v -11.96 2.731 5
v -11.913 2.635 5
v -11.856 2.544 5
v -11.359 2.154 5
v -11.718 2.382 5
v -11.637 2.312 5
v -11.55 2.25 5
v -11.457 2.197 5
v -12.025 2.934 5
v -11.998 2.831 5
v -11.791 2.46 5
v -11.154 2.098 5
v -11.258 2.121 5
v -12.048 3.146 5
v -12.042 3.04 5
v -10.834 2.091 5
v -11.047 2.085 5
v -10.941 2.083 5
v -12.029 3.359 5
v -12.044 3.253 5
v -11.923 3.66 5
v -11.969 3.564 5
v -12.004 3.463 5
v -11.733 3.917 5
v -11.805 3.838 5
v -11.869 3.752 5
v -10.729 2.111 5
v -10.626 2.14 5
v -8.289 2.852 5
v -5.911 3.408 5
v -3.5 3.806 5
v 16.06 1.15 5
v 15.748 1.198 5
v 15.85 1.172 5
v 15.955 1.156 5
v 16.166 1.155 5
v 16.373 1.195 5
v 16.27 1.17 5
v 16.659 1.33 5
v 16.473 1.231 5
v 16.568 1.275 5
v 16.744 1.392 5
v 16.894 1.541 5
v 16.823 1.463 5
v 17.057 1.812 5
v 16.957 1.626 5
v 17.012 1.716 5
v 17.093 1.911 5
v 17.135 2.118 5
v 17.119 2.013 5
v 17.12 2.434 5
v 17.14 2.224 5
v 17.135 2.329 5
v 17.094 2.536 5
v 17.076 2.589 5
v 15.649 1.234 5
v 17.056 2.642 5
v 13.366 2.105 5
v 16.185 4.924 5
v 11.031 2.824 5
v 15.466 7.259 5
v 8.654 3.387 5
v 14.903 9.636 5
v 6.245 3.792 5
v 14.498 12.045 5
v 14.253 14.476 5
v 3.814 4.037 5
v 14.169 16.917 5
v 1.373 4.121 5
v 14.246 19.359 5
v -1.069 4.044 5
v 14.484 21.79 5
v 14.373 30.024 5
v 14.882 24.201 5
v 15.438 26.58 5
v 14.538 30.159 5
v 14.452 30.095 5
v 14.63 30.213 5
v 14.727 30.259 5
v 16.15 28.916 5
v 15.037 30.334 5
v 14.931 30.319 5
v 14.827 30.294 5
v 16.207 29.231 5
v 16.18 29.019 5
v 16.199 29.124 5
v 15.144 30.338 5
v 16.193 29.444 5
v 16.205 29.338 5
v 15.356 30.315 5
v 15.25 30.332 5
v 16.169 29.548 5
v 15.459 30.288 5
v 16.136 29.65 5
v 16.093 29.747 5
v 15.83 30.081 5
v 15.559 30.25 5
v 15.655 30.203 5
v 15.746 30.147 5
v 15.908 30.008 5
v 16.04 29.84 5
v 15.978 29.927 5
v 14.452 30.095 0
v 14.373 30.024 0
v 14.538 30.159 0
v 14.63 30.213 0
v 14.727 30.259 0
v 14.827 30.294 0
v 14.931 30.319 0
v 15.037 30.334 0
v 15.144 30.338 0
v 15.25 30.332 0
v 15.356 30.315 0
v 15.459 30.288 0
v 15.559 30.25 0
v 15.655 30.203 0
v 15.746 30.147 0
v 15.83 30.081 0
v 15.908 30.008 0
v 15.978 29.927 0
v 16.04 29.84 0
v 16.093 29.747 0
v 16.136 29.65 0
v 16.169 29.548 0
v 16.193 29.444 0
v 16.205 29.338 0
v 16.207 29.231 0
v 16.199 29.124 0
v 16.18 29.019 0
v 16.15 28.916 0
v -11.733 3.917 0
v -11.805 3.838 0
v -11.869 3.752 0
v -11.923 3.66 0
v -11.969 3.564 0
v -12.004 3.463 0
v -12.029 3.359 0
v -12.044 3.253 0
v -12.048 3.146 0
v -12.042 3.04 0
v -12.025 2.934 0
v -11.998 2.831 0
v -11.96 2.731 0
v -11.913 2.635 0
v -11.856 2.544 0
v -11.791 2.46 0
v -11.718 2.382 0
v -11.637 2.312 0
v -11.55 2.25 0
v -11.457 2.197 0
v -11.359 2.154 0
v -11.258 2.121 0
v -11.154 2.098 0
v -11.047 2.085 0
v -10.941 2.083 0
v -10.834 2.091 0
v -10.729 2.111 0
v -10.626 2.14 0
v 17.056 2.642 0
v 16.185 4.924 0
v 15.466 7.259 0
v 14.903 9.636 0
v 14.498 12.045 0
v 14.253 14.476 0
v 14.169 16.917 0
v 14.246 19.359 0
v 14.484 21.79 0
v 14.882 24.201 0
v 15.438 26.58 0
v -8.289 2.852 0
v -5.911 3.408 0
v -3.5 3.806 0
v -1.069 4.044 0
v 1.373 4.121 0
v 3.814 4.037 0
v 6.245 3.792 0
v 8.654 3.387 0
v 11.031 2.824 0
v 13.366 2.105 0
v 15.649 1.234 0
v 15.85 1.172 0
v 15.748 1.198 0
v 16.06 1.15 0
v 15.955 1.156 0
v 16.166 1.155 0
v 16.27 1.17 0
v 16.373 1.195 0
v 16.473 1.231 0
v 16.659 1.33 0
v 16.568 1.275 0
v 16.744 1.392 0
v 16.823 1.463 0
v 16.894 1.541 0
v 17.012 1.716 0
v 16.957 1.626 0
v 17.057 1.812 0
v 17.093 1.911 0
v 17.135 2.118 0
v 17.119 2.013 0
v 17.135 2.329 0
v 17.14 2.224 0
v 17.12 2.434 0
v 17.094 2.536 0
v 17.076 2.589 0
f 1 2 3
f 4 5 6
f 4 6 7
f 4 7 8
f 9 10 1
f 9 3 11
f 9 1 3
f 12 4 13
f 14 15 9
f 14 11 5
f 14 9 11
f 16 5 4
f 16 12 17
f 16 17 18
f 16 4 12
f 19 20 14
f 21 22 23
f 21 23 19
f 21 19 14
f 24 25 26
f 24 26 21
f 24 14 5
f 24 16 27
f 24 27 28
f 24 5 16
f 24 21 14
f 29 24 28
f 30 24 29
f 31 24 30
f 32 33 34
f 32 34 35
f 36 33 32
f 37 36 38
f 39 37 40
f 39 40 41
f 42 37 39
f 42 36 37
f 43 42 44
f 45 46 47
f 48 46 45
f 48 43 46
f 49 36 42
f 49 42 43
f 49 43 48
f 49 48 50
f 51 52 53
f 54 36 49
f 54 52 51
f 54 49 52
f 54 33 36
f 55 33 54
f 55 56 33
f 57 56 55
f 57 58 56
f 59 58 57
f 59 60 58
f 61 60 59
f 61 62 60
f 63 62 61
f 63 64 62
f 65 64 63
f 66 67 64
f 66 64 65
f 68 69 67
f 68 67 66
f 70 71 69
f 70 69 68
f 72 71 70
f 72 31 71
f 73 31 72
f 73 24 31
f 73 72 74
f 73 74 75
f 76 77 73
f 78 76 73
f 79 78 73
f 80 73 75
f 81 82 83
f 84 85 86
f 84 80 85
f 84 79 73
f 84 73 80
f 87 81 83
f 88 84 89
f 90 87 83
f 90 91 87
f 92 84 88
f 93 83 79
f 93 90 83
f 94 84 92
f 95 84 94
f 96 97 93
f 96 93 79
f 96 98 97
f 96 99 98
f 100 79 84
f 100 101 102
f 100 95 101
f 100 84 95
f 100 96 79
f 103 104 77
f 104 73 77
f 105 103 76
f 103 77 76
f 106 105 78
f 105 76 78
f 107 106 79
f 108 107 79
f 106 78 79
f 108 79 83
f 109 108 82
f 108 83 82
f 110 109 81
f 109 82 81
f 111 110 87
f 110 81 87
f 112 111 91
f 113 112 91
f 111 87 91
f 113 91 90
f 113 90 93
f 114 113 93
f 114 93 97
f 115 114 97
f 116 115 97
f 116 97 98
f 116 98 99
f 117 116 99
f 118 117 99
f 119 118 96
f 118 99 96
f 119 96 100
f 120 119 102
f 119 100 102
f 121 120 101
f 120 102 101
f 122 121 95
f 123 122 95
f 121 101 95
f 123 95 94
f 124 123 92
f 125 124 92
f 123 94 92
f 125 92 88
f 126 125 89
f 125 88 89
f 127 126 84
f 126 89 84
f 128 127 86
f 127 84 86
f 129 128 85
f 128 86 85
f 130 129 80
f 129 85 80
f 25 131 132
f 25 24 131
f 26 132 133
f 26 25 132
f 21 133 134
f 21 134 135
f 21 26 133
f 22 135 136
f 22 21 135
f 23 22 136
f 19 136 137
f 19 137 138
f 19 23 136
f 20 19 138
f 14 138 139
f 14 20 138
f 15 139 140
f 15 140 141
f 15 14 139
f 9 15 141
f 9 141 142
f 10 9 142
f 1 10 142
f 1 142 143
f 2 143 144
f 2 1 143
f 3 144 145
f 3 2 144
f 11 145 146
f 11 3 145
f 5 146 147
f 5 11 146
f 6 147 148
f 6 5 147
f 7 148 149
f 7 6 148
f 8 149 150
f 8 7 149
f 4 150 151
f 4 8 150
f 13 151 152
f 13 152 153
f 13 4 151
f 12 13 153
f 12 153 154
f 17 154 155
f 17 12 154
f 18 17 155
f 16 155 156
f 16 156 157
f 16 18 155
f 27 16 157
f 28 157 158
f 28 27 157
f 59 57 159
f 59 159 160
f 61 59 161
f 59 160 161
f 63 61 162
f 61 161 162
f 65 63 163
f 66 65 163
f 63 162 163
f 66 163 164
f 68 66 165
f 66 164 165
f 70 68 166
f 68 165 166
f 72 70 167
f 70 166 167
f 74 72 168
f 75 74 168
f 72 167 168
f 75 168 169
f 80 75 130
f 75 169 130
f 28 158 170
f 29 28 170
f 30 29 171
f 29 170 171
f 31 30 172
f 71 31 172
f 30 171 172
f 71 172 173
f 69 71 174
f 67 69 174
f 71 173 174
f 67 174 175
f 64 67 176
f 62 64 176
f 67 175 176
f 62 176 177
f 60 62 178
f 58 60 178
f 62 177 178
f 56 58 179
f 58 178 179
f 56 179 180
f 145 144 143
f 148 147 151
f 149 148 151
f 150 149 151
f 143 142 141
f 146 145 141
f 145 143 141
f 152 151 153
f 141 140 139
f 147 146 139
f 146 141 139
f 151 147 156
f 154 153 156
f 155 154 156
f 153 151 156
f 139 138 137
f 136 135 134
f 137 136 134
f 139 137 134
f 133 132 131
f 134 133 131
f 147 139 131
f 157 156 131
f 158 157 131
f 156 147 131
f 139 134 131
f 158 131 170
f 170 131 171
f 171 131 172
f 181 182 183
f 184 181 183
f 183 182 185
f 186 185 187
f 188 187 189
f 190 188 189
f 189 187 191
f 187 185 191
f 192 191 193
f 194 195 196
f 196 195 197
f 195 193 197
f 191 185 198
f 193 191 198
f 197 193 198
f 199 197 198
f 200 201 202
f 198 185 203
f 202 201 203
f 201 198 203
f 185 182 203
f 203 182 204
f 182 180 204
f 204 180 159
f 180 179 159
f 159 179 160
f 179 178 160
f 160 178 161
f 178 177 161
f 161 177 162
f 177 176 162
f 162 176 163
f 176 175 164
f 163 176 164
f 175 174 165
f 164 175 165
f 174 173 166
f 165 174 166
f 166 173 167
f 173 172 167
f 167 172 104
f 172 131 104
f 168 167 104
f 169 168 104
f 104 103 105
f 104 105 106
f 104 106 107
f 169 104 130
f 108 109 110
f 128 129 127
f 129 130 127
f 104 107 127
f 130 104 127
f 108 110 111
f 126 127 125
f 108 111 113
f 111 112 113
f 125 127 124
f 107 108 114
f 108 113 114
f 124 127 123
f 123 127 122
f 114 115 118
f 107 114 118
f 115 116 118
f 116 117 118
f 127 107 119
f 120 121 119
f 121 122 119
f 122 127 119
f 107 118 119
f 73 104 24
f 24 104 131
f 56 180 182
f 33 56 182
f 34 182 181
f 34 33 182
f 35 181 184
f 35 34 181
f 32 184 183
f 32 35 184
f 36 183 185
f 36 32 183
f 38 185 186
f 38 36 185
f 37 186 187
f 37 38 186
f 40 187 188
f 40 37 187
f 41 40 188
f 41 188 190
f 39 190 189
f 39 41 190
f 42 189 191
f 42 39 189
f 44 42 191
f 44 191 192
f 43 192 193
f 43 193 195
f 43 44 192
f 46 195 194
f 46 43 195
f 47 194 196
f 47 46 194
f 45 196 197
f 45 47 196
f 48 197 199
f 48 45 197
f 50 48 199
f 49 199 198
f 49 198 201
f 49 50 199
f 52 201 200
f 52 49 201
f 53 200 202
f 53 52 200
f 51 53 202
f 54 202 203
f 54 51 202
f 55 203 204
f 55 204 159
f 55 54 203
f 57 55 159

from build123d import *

# Parameters (mm, degrees)
F1_DEPTH = 5
F2_R     = 1.074979


with BuildPart() as f1:
    # F0 (on Top) → F1 (new body)
    with BuildSketch(Plane.XY):
        with BuildLine():
            Line((18.290205, 33.941125), (-15.65092, 0))
            ThreePointArc((-15.65092, 0), (1.319643, 4.121436), (18.290205, 0))
            ThreePointArc((18.290205, 0), (14.16877, 16.970563), (18.290205, 33.941125))
        make_face()
    extrude(amount=F1_DEPTH)

    # F2
    f2_edges = [f1.edges().sort_by_distance(p)[0] for p in [
        (18.290205, 33.941125, 2.5),
        (-15.65092, 0, 2.5),
        (18.290205, 0, 2.5),
    ]]
    fillet(f2_edges, radius=F2_R)


solid = f1.part
